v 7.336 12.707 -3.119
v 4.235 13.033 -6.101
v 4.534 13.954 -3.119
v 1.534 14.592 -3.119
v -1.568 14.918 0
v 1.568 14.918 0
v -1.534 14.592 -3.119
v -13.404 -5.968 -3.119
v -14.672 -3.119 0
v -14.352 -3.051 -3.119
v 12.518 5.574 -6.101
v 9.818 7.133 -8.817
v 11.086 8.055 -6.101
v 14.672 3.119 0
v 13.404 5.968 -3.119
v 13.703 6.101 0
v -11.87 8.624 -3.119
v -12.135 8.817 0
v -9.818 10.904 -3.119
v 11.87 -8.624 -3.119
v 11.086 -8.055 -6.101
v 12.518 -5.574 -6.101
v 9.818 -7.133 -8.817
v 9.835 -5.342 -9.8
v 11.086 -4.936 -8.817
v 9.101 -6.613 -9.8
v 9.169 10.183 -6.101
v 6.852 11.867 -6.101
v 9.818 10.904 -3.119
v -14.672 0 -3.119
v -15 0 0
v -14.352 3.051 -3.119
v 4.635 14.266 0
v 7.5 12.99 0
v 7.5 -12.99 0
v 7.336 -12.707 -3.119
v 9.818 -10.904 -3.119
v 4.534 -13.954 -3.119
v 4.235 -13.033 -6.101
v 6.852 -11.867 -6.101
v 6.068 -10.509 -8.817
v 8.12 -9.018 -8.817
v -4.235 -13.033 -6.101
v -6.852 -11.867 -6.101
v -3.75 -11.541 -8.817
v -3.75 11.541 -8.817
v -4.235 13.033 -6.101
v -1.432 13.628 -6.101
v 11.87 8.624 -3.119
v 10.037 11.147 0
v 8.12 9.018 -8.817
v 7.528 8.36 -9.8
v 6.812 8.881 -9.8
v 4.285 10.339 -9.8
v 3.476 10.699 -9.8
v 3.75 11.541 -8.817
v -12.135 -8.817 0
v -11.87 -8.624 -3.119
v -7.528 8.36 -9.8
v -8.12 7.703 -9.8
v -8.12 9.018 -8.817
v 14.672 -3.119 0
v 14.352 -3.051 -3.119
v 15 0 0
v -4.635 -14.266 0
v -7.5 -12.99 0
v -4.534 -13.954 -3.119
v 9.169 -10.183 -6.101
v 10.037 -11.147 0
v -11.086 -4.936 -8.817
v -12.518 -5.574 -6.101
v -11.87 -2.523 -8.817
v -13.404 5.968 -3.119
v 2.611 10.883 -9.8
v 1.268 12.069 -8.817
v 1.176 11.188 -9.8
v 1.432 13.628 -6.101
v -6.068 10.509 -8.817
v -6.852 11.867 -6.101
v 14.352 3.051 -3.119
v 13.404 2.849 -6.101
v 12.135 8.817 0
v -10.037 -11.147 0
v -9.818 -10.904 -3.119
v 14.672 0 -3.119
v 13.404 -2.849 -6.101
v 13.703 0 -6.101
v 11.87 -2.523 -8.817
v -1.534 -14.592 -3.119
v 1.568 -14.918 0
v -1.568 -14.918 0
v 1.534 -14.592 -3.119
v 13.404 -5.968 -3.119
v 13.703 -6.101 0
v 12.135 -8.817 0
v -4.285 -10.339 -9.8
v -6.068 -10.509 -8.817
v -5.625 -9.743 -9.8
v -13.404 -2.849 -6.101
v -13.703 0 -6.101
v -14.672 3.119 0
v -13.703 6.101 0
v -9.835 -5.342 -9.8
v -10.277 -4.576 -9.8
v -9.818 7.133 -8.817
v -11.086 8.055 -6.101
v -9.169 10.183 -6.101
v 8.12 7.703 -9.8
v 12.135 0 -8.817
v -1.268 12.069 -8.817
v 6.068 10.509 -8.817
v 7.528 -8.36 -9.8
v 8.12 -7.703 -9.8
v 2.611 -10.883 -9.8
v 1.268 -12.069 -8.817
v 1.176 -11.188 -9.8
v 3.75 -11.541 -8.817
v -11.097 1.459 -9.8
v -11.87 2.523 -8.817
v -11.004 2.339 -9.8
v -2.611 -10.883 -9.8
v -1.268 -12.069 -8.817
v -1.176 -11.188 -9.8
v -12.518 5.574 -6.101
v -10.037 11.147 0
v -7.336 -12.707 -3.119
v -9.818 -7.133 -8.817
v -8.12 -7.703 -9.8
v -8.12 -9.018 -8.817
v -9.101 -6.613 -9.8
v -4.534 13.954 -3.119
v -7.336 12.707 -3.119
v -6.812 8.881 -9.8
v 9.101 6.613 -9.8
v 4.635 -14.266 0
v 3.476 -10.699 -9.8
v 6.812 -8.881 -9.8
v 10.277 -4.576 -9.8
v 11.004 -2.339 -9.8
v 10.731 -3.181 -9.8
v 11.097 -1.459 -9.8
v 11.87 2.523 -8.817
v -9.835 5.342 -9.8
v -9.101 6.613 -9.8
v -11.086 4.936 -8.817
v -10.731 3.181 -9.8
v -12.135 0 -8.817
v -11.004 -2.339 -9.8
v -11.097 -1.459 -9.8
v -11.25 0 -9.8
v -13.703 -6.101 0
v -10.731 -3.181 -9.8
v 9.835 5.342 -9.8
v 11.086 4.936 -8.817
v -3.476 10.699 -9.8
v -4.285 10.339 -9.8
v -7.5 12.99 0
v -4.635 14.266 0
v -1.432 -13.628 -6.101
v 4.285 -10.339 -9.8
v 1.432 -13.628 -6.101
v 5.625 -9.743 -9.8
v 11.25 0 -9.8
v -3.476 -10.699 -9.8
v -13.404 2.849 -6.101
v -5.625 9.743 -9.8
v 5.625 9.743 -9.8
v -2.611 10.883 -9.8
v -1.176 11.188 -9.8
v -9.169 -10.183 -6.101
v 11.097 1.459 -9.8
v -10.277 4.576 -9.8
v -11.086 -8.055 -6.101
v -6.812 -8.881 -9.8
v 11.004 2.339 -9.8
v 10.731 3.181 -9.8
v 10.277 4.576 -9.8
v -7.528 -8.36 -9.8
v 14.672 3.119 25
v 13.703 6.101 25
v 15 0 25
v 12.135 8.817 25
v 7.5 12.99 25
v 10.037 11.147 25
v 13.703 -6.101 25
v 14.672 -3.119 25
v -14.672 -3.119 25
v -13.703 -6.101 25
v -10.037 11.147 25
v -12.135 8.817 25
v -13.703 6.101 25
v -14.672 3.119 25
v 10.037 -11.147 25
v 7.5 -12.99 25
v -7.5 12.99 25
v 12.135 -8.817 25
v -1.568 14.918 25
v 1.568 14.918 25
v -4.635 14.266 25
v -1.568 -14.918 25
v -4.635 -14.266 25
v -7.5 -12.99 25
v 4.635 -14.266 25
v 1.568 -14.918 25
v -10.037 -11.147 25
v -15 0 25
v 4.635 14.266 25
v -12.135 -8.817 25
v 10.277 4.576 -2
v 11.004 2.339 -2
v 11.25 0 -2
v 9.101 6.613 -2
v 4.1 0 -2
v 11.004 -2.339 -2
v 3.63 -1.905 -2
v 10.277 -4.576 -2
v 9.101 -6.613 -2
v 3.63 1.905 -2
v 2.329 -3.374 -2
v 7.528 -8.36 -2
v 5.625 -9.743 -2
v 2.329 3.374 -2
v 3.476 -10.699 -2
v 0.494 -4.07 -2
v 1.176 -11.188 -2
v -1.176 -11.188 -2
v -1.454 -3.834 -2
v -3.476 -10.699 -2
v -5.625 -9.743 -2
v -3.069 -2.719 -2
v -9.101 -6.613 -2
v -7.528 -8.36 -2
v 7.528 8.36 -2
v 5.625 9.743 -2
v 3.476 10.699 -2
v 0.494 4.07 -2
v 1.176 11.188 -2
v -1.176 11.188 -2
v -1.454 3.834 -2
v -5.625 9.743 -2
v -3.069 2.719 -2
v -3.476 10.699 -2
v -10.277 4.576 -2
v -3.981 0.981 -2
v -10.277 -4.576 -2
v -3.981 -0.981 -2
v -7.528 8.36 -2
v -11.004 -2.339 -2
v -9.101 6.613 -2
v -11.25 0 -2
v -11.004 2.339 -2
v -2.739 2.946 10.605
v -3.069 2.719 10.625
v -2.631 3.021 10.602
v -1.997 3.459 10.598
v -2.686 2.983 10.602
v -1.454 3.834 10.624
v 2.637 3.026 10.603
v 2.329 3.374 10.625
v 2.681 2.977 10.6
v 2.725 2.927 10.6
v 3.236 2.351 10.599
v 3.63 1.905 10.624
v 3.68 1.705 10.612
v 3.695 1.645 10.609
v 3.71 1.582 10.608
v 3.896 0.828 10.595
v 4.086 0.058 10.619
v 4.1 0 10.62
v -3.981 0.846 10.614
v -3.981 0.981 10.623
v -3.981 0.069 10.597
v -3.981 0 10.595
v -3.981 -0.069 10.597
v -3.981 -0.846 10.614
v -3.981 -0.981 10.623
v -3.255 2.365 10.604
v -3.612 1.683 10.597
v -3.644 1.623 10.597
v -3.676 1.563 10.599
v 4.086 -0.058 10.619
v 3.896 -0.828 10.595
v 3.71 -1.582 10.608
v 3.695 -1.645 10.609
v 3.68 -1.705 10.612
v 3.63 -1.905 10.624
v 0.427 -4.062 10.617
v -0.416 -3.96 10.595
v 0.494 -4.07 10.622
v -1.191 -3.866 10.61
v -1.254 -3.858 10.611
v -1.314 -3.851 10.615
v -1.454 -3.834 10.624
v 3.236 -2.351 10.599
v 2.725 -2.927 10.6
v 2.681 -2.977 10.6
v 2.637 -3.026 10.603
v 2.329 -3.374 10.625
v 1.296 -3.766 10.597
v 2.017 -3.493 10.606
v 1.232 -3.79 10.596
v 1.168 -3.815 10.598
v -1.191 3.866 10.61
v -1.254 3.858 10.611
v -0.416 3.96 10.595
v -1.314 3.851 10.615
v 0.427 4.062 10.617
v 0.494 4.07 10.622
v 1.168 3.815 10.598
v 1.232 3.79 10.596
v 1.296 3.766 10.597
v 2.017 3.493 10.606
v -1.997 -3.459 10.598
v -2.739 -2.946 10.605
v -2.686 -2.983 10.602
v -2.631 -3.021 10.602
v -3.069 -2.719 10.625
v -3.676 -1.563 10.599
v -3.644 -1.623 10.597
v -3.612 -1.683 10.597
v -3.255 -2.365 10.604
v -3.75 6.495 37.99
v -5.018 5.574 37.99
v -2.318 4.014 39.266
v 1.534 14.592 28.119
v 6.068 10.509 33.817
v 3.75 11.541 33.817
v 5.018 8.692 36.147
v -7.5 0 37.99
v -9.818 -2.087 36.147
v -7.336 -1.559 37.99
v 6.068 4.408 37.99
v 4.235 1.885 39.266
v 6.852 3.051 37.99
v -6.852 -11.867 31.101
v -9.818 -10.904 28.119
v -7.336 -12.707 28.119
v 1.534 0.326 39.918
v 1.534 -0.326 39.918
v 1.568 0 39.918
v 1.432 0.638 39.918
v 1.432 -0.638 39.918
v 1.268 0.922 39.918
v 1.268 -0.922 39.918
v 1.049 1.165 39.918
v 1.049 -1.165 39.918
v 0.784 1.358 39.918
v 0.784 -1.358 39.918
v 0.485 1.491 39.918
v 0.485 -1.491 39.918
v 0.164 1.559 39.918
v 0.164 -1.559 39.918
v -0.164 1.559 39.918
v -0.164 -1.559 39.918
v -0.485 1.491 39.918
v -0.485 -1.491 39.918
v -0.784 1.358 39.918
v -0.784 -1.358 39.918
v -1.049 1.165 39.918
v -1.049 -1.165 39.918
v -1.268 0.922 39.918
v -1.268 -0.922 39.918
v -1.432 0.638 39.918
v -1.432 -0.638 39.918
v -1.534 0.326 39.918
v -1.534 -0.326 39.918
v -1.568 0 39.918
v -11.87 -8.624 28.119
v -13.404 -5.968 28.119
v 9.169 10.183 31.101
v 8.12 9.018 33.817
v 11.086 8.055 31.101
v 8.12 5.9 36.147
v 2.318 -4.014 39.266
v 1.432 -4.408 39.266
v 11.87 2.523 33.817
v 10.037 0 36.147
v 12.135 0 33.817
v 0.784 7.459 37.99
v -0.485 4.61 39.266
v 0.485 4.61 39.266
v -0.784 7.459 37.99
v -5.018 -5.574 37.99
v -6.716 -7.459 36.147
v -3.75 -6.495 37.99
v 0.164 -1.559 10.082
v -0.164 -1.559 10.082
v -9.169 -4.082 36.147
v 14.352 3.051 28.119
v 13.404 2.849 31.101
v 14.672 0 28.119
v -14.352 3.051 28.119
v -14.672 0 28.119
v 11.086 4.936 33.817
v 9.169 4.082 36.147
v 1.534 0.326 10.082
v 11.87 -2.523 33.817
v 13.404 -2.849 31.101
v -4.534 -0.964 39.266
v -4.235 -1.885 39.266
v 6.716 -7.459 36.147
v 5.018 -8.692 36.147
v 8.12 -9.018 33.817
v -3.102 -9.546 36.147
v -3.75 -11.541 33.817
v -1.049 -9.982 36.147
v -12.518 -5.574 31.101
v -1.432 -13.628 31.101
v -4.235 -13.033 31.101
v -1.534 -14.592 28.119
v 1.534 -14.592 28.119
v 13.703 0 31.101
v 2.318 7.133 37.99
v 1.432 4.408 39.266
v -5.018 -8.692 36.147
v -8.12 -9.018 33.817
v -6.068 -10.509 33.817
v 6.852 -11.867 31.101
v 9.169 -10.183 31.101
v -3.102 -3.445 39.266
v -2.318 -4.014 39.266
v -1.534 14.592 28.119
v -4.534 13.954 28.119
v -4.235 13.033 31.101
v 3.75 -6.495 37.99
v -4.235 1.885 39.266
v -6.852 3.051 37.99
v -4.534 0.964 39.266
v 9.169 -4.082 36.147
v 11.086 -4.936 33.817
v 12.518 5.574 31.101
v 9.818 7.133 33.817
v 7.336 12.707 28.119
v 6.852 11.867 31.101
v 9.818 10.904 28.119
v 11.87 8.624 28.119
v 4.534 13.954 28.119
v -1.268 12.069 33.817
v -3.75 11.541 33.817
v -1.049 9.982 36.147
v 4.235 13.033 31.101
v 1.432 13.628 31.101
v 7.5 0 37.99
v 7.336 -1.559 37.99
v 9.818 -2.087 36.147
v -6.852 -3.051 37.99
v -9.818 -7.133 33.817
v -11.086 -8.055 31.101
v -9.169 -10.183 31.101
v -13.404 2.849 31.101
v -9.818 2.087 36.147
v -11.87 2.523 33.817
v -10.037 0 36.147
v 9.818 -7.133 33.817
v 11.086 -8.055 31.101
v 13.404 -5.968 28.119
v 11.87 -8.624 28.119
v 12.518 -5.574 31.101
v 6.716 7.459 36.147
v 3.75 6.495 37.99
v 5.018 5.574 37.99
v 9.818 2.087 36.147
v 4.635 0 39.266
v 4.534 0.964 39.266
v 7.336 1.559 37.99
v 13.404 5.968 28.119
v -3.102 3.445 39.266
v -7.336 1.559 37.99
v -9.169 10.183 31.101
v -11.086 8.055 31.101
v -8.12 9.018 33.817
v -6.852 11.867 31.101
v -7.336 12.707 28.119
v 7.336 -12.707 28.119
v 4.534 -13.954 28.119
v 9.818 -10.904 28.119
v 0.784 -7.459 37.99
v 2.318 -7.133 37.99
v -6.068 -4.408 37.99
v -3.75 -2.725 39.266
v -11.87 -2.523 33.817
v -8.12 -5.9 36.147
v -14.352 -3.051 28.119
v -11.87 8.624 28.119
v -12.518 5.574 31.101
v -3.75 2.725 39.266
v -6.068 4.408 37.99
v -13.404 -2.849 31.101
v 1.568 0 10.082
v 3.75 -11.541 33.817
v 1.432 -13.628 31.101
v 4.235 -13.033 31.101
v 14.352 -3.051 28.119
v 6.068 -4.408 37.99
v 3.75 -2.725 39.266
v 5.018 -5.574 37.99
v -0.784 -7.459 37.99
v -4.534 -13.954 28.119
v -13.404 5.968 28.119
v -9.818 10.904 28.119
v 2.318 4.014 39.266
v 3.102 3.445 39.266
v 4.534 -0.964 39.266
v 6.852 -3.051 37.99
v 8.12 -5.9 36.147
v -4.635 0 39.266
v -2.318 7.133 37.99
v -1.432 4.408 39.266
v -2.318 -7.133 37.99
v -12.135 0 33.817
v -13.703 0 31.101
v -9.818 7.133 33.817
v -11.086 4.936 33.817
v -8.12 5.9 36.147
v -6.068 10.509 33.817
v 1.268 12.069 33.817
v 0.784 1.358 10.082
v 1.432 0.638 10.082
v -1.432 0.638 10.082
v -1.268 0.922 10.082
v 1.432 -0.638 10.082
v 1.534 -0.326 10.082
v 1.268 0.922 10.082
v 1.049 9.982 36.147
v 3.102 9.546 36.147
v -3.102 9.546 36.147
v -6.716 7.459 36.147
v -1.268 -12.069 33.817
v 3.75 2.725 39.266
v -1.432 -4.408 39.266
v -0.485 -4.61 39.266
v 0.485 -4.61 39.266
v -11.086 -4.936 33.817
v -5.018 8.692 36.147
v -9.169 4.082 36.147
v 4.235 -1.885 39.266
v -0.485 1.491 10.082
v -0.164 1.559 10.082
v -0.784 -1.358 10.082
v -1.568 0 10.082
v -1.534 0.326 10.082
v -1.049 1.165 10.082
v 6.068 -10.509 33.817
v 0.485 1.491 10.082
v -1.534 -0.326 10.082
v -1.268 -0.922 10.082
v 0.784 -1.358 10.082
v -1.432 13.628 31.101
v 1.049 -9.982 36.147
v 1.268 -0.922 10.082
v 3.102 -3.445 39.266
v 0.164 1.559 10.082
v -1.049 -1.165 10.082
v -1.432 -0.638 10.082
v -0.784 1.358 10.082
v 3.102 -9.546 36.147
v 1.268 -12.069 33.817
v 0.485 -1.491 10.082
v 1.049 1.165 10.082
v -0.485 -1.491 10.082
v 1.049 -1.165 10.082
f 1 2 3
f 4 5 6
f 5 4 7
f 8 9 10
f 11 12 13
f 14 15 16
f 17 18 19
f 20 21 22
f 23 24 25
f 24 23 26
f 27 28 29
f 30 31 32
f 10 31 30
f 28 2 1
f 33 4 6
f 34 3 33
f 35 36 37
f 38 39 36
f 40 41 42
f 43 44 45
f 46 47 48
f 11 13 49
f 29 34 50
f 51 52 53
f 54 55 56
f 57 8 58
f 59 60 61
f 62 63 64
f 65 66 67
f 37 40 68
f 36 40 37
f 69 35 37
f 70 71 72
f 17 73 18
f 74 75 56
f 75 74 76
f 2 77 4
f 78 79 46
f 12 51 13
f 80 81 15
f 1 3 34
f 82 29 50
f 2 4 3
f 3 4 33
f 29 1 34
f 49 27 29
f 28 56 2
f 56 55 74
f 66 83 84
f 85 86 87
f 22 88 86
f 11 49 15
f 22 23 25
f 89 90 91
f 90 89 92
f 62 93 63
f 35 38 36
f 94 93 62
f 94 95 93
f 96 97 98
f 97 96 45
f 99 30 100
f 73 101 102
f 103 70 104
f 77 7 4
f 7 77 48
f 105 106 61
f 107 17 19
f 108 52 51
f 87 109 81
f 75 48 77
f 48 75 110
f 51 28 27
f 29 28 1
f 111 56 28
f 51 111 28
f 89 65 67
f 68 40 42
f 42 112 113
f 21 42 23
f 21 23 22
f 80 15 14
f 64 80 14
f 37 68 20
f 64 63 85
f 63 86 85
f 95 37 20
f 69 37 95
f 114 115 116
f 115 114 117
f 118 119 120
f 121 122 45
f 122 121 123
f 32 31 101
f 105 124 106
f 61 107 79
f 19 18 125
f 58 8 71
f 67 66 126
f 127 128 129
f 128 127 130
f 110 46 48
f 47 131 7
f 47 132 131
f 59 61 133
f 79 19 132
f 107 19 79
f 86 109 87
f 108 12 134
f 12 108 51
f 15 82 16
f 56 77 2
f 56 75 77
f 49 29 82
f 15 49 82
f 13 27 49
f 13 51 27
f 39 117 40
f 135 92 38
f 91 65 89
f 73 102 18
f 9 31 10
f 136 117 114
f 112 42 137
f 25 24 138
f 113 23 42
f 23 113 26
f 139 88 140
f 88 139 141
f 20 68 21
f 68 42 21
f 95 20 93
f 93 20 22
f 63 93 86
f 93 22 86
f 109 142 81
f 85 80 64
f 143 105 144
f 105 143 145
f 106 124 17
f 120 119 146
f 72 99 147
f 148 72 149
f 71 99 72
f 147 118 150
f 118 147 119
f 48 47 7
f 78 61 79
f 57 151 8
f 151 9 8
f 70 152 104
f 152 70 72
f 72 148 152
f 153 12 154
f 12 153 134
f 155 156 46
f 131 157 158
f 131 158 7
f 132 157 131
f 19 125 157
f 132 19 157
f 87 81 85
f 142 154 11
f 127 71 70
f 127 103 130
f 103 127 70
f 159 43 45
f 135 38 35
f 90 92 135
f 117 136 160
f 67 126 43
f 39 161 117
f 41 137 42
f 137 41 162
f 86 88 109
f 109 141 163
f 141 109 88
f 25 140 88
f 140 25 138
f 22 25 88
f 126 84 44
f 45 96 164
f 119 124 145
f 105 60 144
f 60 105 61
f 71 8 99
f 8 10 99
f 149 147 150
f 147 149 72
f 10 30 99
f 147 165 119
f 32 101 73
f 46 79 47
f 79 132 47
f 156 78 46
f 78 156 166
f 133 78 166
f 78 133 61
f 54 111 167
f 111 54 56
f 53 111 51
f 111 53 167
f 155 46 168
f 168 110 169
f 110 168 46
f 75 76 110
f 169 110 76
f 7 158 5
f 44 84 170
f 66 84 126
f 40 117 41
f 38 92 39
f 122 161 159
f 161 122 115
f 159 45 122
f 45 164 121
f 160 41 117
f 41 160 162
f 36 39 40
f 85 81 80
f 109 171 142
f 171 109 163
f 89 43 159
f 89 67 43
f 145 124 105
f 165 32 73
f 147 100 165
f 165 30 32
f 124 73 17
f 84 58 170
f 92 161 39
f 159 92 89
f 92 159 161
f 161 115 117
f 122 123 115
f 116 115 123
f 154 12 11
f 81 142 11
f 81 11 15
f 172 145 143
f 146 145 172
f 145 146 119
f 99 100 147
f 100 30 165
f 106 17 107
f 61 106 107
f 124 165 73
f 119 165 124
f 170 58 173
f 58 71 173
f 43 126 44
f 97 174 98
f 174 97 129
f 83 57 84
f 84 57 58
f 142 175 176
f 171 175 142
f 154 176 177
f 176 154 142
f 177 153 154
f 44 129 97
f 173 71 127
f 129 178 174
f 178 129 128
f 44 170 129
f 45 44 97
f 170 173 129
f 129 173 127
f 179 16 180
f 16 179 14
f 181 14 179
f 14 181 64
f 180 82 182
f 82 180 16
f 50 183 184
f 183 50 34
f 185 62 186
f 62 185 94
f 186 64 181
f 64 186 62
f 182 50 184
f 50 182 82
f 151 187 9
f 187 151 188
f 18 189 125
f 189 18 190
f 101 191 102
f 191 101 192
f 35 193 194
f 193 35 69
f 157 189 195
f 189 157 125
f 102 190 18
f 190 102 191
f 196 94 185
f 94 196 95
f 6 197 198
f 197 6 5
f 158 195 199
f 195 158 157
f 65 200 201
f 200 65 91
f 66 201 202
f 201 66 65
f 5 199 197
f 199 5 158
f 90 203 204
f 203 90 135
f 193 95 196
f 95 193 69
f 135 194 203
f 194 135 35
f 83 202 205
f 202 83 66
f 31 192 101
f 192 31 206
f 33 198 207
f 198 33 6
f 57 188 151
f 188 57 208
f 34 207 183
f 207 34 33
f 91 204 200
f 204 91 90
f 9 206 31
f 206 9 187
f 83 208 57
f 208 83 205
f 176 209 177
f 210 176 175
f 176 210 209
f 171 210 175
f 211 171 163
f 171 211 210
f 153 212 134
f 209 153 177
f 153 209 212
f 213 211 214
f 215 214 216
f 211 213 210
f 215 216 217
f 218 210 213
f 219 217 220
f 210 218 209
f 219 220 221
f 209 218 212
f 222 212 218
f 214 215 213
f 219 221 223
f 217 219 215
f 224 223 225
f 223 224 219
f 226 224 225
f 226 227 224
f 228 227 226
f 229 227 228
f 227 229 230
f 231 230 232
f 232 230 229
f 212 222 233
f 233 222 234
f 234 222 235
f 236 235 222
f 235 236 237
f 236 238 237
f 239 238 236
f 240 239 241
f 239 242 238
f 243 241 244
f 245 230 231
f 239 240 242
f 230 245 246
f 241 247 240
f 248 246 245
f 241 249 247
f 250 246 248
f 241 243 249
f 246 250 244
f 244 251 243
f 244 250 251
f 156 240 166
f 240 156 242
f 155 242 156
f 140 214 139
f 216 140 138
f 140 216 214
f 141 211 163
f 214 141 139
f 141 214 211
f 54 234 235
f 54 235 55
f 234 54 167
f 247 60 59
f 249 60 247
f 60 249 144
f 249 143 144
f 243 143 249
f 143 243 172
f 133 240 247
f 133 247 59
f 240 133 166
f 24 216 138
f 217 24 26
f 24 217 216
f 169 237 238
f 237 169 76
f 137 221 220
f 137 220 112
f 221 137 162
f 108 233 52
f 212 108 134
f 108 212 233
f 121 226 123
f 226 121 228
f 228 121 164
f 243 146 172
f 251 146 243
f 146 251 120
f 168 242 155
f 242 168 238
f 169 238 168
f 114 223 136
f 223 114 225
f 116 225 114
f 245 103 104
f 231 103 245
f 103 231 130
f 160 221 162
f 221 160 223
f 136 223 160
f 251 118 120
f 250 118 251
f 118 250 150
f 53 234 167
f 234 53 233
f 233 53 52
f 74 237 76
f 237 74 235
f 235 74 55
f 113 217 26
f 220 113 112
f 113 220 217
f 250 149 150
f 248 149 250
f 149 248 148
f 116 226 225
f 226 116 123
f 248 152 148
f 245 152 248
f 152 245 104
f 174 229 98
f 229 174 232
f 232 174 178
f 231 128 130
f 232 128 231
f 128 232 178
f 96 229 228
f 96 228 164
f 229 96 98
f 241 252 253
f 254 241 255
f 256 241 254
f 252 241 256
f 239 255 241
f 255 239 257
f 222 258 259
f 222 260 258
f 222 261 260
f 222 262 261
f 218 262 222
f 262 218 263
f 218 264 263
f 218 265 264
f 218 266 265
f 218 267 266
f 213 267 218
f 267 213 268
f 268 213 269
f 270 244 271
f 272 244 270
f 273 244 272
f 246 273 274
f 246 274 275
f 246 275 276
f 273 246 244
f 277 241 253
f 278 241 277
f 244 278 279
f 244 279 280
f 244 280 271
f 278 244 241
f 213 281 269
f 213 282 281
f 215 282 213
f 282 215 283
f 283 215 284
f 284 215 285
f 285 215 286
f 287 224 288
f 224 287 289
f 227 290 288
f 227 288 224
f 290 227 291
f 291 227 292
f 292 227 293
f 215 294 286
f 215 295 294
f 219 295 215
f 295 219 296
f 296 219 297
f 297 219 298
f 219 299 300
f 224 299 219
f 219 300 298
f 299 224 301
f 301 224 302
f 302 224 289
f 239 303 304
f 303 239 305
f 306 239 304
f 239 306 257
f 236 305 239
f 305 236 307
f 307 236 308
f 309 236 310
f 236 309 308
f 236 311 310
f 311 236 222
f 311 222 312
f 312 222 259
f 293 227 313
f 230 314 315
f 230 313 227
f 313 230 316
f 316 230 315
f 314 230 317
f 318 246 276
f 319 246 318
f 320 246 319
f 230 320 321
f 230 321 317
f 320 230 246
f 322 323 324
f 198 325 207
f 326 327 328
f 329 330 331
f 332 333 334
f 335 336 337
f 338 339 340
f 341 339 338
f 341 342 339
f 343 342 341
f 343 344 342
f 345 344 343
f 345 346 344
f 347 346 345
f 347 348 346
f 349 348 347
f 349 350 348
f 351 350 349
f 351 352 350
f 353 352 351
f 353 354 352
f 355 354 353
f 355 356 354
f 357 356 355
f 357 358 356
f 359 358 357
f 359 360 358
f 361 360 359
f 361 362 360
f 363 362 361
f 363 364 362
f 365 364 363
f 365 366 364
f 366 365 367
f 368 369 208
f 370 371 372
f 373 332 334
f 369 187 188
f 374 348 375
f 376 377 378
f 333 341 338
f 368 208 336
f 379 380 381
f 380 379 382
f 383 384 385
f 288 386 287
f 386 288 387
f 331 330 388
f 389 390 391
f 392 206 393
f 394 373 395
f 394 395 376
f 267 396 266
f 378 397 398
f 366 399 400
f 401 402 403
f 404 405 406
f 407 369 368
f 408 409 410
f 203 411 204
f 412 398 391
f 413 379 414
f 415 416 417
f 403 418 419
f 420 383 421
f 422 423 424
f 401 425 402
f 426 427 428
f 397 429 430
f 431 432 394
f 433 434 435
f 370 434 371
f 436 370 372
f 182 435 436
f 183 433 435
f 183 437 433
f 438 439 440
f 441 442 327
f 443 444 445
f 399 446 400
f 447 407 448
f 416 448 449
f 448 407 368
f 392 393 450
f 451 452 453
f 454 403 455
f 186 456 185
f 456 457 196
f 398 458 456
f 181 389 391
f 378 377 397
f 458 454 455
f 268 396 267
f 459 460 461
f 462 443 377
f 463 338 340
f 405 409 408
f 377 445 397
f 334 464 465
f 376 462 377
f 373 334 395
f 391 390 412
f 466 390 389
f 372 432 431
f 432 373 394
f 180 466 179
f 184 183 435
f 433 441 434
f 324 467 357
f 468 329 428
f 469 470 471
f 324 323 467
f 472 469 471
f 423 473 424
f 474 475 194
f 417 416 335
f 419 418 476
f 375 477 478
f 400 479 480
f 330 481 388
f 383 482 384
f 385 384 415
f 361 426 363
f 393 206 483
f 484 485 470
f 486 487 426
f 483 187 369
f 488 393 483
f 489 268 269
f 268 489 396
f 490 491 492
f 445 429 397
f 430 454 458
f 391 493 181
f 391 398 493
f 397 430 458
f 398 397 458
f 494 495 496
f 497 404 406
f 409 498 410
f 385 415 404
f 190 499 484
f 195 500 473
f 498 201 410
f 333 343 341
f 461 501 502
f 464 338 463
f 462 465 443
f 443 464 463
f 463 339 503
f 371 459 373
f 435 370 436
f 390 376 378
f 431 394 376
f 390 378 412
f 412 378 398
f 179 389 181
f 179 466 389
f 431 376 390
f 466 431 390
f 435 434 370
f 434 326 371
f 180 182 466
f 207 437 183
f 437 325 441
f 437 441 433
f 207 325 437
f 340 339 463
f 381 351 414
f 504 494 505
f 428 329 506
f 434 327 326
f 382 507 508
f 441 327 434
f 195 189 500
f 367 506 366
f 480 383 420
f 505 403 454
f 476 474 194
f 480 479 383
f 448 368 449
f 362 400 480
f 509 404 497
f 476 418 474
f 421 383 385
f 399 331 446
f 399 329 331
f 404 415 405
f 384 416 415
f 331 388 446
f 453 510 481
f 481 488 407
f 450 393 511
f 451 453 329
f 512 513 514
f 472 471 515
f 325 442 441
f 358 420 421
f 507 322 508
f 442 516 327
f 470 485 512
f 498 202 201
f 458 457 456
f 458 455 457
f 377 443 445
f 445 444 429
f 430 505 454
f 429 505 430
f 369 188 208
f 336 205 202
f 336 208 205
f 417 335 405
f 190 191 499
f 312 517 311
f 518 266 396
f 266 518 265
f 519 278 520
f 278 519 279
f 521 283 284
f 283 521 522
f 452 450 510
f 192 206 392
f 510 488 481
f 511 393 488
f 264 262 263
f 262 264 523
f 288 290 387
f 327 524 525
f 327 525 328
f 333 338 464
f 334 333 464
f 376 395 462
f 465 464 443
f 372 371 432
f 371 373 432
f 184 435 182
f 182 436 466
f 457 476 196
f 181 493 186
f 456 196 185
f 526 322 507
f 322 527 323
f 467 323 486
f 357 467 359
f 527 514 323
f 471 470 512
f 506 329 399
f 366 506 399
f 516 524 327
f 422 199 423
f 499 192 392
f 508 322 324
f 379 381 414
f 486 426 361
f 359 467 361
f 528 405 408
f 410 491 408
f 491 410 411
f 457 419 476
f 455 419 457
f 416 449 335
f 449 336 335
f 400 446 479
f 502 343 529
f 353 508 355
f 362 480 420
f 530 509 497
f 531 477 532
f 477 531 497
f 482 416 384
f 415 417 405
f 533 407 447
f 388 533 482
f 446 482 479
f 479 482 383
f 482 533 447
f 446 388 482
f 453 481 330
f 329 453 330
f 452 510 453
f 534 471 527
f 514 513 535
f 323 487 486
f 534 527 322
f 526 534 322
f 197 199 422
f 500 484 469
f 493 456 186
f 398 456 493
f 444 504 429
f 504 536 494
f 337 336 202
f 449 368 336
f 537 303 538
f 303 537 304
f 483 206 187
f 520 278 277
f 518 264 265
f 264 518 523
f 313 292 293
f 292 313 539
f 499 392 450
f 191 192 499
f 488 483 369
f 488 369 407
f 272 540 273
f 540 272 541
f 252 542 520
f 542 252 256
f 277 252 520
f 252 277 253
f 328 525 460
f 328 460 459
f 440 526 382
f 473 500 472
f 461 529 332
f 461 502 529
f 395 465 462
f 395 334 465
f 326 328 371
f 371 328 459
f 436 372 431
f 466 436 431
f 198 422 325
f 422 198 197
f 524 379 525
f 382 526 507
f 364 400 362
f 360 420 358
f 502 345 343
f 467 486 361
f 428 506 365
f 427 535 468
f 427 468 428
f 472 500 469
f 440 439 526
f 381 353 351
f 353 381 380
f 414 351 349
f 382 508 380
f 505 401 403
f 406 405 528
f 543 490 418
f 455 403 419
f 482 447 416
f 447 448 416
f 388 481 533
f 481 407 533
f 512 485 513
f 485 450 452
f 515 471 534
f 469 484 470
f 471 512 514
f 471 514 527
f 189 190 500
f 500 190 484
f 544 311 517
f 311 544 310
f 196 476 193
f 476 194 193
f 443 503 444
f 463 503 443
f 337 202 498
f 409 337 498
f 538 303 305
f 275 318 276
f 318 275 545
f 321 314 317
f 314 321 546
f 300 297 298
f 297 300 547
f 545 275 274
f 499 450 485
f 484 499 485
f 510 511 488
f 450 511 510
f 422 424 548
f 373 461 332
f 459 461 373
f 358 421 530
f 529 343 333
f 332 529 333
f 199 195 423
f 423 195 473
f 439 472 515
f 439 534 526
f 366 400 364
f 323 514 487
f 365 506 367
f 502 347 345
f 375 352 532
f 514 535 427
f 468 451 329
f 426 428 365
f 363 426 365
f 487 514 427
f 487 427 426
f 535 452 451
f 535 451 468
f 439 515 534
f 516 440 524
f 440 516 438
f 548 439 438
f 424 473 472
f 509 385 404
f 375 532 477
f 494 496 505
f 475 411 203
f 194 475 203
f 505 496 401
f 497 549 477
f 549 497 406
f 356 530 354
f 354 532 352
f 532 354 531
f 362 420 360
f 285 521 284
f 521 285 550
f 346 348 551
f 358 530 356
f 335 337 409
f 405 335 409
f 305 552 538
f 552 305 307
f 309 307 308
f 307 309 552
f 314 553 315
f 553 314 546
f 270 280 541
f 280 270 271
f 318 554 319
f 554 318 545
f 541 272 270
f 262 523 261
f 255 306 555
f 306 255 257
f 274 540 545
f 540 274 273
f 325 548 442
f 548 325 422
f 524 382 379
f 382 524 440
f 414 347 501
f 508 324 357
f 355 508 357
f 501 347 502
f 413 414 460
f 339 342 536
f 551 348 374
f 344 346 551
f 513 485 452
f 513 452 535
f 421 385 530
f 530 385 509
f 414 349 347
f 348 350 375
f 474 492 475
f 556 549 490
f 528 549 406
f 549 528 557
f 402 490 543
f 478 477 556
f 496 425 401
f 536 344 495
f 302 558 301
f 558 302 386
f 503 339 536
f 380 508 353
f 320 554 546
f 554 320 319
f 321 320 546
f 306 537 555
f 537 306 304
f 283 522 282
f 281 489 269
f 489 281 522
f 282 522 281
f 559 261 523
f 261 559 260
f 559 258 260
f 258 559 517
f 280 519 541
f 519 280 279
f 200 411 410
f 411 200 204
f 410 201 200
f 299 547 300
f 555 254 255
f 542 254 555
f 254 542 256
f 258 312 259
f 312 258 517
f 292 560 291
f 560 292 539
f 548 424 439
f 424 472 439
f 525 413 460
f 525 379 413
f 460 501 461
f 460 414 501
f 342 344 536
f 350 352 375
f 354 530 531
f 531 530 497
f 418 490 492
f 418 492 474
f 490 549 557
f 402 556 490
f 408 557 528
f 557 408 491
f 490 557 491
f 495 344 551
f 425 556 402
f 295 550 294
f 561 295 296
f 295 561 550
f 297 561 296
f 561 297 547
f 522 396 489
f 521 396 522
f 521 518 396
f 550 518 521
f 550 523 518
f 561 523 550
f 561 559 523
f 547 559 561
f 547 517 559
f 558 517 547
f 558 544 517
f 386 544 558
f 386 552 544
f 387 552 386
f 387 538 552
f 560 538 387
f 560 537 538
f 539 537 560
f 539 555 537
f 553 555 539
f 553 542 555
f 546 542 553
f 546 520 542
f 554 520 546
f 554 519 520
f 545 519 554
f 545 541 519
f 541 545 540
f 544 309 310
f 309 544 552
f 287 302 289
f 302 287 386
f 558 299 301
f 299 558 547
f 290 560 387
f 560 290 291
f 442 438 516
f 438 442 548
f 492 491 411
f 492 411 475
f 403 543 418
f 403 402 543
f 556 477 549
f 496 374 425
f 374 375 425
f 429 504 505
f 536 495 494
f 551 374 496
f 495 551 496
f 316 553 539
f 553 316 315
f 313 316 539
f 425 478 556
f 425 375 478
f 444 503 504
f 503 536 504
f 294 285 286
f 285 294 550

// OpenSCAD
// Modify these
TOTAL_HEIGHT=40;
TOTAL_DIAMETER=30;

// Not these
RADIUS=TOTAL_DIAMETER/2;
CYL_HEIGHT=TOTAL_HEIGHT - RADIUS;

module mainCylinder()
{
    color("red")
        cylinder(CYL_HEIGHT, RADIUS, RADIUS);
}

module baseCylinder()
{
    color("green")
    union()
    {
        cylinder(10, RADIUS, RADIUS); 
        translate([0, 0, 10])
            cylinder(10, RADIUS * 0.75, RADIUS * 0.75);
        translate([0, 0, 20])
            cylinder(13, 4.1, 4.1);
    }
}

module endCap()
{
    color("blue")
        sphere(RADIUS);
}

difference()
{
    union()
    {
        endCap();
        mainCylinder();
    }
    translate([0, 0, -22])
        baseCylinder();
}

translate([0, 0, CYL_HEIGHT])
    endCap();
